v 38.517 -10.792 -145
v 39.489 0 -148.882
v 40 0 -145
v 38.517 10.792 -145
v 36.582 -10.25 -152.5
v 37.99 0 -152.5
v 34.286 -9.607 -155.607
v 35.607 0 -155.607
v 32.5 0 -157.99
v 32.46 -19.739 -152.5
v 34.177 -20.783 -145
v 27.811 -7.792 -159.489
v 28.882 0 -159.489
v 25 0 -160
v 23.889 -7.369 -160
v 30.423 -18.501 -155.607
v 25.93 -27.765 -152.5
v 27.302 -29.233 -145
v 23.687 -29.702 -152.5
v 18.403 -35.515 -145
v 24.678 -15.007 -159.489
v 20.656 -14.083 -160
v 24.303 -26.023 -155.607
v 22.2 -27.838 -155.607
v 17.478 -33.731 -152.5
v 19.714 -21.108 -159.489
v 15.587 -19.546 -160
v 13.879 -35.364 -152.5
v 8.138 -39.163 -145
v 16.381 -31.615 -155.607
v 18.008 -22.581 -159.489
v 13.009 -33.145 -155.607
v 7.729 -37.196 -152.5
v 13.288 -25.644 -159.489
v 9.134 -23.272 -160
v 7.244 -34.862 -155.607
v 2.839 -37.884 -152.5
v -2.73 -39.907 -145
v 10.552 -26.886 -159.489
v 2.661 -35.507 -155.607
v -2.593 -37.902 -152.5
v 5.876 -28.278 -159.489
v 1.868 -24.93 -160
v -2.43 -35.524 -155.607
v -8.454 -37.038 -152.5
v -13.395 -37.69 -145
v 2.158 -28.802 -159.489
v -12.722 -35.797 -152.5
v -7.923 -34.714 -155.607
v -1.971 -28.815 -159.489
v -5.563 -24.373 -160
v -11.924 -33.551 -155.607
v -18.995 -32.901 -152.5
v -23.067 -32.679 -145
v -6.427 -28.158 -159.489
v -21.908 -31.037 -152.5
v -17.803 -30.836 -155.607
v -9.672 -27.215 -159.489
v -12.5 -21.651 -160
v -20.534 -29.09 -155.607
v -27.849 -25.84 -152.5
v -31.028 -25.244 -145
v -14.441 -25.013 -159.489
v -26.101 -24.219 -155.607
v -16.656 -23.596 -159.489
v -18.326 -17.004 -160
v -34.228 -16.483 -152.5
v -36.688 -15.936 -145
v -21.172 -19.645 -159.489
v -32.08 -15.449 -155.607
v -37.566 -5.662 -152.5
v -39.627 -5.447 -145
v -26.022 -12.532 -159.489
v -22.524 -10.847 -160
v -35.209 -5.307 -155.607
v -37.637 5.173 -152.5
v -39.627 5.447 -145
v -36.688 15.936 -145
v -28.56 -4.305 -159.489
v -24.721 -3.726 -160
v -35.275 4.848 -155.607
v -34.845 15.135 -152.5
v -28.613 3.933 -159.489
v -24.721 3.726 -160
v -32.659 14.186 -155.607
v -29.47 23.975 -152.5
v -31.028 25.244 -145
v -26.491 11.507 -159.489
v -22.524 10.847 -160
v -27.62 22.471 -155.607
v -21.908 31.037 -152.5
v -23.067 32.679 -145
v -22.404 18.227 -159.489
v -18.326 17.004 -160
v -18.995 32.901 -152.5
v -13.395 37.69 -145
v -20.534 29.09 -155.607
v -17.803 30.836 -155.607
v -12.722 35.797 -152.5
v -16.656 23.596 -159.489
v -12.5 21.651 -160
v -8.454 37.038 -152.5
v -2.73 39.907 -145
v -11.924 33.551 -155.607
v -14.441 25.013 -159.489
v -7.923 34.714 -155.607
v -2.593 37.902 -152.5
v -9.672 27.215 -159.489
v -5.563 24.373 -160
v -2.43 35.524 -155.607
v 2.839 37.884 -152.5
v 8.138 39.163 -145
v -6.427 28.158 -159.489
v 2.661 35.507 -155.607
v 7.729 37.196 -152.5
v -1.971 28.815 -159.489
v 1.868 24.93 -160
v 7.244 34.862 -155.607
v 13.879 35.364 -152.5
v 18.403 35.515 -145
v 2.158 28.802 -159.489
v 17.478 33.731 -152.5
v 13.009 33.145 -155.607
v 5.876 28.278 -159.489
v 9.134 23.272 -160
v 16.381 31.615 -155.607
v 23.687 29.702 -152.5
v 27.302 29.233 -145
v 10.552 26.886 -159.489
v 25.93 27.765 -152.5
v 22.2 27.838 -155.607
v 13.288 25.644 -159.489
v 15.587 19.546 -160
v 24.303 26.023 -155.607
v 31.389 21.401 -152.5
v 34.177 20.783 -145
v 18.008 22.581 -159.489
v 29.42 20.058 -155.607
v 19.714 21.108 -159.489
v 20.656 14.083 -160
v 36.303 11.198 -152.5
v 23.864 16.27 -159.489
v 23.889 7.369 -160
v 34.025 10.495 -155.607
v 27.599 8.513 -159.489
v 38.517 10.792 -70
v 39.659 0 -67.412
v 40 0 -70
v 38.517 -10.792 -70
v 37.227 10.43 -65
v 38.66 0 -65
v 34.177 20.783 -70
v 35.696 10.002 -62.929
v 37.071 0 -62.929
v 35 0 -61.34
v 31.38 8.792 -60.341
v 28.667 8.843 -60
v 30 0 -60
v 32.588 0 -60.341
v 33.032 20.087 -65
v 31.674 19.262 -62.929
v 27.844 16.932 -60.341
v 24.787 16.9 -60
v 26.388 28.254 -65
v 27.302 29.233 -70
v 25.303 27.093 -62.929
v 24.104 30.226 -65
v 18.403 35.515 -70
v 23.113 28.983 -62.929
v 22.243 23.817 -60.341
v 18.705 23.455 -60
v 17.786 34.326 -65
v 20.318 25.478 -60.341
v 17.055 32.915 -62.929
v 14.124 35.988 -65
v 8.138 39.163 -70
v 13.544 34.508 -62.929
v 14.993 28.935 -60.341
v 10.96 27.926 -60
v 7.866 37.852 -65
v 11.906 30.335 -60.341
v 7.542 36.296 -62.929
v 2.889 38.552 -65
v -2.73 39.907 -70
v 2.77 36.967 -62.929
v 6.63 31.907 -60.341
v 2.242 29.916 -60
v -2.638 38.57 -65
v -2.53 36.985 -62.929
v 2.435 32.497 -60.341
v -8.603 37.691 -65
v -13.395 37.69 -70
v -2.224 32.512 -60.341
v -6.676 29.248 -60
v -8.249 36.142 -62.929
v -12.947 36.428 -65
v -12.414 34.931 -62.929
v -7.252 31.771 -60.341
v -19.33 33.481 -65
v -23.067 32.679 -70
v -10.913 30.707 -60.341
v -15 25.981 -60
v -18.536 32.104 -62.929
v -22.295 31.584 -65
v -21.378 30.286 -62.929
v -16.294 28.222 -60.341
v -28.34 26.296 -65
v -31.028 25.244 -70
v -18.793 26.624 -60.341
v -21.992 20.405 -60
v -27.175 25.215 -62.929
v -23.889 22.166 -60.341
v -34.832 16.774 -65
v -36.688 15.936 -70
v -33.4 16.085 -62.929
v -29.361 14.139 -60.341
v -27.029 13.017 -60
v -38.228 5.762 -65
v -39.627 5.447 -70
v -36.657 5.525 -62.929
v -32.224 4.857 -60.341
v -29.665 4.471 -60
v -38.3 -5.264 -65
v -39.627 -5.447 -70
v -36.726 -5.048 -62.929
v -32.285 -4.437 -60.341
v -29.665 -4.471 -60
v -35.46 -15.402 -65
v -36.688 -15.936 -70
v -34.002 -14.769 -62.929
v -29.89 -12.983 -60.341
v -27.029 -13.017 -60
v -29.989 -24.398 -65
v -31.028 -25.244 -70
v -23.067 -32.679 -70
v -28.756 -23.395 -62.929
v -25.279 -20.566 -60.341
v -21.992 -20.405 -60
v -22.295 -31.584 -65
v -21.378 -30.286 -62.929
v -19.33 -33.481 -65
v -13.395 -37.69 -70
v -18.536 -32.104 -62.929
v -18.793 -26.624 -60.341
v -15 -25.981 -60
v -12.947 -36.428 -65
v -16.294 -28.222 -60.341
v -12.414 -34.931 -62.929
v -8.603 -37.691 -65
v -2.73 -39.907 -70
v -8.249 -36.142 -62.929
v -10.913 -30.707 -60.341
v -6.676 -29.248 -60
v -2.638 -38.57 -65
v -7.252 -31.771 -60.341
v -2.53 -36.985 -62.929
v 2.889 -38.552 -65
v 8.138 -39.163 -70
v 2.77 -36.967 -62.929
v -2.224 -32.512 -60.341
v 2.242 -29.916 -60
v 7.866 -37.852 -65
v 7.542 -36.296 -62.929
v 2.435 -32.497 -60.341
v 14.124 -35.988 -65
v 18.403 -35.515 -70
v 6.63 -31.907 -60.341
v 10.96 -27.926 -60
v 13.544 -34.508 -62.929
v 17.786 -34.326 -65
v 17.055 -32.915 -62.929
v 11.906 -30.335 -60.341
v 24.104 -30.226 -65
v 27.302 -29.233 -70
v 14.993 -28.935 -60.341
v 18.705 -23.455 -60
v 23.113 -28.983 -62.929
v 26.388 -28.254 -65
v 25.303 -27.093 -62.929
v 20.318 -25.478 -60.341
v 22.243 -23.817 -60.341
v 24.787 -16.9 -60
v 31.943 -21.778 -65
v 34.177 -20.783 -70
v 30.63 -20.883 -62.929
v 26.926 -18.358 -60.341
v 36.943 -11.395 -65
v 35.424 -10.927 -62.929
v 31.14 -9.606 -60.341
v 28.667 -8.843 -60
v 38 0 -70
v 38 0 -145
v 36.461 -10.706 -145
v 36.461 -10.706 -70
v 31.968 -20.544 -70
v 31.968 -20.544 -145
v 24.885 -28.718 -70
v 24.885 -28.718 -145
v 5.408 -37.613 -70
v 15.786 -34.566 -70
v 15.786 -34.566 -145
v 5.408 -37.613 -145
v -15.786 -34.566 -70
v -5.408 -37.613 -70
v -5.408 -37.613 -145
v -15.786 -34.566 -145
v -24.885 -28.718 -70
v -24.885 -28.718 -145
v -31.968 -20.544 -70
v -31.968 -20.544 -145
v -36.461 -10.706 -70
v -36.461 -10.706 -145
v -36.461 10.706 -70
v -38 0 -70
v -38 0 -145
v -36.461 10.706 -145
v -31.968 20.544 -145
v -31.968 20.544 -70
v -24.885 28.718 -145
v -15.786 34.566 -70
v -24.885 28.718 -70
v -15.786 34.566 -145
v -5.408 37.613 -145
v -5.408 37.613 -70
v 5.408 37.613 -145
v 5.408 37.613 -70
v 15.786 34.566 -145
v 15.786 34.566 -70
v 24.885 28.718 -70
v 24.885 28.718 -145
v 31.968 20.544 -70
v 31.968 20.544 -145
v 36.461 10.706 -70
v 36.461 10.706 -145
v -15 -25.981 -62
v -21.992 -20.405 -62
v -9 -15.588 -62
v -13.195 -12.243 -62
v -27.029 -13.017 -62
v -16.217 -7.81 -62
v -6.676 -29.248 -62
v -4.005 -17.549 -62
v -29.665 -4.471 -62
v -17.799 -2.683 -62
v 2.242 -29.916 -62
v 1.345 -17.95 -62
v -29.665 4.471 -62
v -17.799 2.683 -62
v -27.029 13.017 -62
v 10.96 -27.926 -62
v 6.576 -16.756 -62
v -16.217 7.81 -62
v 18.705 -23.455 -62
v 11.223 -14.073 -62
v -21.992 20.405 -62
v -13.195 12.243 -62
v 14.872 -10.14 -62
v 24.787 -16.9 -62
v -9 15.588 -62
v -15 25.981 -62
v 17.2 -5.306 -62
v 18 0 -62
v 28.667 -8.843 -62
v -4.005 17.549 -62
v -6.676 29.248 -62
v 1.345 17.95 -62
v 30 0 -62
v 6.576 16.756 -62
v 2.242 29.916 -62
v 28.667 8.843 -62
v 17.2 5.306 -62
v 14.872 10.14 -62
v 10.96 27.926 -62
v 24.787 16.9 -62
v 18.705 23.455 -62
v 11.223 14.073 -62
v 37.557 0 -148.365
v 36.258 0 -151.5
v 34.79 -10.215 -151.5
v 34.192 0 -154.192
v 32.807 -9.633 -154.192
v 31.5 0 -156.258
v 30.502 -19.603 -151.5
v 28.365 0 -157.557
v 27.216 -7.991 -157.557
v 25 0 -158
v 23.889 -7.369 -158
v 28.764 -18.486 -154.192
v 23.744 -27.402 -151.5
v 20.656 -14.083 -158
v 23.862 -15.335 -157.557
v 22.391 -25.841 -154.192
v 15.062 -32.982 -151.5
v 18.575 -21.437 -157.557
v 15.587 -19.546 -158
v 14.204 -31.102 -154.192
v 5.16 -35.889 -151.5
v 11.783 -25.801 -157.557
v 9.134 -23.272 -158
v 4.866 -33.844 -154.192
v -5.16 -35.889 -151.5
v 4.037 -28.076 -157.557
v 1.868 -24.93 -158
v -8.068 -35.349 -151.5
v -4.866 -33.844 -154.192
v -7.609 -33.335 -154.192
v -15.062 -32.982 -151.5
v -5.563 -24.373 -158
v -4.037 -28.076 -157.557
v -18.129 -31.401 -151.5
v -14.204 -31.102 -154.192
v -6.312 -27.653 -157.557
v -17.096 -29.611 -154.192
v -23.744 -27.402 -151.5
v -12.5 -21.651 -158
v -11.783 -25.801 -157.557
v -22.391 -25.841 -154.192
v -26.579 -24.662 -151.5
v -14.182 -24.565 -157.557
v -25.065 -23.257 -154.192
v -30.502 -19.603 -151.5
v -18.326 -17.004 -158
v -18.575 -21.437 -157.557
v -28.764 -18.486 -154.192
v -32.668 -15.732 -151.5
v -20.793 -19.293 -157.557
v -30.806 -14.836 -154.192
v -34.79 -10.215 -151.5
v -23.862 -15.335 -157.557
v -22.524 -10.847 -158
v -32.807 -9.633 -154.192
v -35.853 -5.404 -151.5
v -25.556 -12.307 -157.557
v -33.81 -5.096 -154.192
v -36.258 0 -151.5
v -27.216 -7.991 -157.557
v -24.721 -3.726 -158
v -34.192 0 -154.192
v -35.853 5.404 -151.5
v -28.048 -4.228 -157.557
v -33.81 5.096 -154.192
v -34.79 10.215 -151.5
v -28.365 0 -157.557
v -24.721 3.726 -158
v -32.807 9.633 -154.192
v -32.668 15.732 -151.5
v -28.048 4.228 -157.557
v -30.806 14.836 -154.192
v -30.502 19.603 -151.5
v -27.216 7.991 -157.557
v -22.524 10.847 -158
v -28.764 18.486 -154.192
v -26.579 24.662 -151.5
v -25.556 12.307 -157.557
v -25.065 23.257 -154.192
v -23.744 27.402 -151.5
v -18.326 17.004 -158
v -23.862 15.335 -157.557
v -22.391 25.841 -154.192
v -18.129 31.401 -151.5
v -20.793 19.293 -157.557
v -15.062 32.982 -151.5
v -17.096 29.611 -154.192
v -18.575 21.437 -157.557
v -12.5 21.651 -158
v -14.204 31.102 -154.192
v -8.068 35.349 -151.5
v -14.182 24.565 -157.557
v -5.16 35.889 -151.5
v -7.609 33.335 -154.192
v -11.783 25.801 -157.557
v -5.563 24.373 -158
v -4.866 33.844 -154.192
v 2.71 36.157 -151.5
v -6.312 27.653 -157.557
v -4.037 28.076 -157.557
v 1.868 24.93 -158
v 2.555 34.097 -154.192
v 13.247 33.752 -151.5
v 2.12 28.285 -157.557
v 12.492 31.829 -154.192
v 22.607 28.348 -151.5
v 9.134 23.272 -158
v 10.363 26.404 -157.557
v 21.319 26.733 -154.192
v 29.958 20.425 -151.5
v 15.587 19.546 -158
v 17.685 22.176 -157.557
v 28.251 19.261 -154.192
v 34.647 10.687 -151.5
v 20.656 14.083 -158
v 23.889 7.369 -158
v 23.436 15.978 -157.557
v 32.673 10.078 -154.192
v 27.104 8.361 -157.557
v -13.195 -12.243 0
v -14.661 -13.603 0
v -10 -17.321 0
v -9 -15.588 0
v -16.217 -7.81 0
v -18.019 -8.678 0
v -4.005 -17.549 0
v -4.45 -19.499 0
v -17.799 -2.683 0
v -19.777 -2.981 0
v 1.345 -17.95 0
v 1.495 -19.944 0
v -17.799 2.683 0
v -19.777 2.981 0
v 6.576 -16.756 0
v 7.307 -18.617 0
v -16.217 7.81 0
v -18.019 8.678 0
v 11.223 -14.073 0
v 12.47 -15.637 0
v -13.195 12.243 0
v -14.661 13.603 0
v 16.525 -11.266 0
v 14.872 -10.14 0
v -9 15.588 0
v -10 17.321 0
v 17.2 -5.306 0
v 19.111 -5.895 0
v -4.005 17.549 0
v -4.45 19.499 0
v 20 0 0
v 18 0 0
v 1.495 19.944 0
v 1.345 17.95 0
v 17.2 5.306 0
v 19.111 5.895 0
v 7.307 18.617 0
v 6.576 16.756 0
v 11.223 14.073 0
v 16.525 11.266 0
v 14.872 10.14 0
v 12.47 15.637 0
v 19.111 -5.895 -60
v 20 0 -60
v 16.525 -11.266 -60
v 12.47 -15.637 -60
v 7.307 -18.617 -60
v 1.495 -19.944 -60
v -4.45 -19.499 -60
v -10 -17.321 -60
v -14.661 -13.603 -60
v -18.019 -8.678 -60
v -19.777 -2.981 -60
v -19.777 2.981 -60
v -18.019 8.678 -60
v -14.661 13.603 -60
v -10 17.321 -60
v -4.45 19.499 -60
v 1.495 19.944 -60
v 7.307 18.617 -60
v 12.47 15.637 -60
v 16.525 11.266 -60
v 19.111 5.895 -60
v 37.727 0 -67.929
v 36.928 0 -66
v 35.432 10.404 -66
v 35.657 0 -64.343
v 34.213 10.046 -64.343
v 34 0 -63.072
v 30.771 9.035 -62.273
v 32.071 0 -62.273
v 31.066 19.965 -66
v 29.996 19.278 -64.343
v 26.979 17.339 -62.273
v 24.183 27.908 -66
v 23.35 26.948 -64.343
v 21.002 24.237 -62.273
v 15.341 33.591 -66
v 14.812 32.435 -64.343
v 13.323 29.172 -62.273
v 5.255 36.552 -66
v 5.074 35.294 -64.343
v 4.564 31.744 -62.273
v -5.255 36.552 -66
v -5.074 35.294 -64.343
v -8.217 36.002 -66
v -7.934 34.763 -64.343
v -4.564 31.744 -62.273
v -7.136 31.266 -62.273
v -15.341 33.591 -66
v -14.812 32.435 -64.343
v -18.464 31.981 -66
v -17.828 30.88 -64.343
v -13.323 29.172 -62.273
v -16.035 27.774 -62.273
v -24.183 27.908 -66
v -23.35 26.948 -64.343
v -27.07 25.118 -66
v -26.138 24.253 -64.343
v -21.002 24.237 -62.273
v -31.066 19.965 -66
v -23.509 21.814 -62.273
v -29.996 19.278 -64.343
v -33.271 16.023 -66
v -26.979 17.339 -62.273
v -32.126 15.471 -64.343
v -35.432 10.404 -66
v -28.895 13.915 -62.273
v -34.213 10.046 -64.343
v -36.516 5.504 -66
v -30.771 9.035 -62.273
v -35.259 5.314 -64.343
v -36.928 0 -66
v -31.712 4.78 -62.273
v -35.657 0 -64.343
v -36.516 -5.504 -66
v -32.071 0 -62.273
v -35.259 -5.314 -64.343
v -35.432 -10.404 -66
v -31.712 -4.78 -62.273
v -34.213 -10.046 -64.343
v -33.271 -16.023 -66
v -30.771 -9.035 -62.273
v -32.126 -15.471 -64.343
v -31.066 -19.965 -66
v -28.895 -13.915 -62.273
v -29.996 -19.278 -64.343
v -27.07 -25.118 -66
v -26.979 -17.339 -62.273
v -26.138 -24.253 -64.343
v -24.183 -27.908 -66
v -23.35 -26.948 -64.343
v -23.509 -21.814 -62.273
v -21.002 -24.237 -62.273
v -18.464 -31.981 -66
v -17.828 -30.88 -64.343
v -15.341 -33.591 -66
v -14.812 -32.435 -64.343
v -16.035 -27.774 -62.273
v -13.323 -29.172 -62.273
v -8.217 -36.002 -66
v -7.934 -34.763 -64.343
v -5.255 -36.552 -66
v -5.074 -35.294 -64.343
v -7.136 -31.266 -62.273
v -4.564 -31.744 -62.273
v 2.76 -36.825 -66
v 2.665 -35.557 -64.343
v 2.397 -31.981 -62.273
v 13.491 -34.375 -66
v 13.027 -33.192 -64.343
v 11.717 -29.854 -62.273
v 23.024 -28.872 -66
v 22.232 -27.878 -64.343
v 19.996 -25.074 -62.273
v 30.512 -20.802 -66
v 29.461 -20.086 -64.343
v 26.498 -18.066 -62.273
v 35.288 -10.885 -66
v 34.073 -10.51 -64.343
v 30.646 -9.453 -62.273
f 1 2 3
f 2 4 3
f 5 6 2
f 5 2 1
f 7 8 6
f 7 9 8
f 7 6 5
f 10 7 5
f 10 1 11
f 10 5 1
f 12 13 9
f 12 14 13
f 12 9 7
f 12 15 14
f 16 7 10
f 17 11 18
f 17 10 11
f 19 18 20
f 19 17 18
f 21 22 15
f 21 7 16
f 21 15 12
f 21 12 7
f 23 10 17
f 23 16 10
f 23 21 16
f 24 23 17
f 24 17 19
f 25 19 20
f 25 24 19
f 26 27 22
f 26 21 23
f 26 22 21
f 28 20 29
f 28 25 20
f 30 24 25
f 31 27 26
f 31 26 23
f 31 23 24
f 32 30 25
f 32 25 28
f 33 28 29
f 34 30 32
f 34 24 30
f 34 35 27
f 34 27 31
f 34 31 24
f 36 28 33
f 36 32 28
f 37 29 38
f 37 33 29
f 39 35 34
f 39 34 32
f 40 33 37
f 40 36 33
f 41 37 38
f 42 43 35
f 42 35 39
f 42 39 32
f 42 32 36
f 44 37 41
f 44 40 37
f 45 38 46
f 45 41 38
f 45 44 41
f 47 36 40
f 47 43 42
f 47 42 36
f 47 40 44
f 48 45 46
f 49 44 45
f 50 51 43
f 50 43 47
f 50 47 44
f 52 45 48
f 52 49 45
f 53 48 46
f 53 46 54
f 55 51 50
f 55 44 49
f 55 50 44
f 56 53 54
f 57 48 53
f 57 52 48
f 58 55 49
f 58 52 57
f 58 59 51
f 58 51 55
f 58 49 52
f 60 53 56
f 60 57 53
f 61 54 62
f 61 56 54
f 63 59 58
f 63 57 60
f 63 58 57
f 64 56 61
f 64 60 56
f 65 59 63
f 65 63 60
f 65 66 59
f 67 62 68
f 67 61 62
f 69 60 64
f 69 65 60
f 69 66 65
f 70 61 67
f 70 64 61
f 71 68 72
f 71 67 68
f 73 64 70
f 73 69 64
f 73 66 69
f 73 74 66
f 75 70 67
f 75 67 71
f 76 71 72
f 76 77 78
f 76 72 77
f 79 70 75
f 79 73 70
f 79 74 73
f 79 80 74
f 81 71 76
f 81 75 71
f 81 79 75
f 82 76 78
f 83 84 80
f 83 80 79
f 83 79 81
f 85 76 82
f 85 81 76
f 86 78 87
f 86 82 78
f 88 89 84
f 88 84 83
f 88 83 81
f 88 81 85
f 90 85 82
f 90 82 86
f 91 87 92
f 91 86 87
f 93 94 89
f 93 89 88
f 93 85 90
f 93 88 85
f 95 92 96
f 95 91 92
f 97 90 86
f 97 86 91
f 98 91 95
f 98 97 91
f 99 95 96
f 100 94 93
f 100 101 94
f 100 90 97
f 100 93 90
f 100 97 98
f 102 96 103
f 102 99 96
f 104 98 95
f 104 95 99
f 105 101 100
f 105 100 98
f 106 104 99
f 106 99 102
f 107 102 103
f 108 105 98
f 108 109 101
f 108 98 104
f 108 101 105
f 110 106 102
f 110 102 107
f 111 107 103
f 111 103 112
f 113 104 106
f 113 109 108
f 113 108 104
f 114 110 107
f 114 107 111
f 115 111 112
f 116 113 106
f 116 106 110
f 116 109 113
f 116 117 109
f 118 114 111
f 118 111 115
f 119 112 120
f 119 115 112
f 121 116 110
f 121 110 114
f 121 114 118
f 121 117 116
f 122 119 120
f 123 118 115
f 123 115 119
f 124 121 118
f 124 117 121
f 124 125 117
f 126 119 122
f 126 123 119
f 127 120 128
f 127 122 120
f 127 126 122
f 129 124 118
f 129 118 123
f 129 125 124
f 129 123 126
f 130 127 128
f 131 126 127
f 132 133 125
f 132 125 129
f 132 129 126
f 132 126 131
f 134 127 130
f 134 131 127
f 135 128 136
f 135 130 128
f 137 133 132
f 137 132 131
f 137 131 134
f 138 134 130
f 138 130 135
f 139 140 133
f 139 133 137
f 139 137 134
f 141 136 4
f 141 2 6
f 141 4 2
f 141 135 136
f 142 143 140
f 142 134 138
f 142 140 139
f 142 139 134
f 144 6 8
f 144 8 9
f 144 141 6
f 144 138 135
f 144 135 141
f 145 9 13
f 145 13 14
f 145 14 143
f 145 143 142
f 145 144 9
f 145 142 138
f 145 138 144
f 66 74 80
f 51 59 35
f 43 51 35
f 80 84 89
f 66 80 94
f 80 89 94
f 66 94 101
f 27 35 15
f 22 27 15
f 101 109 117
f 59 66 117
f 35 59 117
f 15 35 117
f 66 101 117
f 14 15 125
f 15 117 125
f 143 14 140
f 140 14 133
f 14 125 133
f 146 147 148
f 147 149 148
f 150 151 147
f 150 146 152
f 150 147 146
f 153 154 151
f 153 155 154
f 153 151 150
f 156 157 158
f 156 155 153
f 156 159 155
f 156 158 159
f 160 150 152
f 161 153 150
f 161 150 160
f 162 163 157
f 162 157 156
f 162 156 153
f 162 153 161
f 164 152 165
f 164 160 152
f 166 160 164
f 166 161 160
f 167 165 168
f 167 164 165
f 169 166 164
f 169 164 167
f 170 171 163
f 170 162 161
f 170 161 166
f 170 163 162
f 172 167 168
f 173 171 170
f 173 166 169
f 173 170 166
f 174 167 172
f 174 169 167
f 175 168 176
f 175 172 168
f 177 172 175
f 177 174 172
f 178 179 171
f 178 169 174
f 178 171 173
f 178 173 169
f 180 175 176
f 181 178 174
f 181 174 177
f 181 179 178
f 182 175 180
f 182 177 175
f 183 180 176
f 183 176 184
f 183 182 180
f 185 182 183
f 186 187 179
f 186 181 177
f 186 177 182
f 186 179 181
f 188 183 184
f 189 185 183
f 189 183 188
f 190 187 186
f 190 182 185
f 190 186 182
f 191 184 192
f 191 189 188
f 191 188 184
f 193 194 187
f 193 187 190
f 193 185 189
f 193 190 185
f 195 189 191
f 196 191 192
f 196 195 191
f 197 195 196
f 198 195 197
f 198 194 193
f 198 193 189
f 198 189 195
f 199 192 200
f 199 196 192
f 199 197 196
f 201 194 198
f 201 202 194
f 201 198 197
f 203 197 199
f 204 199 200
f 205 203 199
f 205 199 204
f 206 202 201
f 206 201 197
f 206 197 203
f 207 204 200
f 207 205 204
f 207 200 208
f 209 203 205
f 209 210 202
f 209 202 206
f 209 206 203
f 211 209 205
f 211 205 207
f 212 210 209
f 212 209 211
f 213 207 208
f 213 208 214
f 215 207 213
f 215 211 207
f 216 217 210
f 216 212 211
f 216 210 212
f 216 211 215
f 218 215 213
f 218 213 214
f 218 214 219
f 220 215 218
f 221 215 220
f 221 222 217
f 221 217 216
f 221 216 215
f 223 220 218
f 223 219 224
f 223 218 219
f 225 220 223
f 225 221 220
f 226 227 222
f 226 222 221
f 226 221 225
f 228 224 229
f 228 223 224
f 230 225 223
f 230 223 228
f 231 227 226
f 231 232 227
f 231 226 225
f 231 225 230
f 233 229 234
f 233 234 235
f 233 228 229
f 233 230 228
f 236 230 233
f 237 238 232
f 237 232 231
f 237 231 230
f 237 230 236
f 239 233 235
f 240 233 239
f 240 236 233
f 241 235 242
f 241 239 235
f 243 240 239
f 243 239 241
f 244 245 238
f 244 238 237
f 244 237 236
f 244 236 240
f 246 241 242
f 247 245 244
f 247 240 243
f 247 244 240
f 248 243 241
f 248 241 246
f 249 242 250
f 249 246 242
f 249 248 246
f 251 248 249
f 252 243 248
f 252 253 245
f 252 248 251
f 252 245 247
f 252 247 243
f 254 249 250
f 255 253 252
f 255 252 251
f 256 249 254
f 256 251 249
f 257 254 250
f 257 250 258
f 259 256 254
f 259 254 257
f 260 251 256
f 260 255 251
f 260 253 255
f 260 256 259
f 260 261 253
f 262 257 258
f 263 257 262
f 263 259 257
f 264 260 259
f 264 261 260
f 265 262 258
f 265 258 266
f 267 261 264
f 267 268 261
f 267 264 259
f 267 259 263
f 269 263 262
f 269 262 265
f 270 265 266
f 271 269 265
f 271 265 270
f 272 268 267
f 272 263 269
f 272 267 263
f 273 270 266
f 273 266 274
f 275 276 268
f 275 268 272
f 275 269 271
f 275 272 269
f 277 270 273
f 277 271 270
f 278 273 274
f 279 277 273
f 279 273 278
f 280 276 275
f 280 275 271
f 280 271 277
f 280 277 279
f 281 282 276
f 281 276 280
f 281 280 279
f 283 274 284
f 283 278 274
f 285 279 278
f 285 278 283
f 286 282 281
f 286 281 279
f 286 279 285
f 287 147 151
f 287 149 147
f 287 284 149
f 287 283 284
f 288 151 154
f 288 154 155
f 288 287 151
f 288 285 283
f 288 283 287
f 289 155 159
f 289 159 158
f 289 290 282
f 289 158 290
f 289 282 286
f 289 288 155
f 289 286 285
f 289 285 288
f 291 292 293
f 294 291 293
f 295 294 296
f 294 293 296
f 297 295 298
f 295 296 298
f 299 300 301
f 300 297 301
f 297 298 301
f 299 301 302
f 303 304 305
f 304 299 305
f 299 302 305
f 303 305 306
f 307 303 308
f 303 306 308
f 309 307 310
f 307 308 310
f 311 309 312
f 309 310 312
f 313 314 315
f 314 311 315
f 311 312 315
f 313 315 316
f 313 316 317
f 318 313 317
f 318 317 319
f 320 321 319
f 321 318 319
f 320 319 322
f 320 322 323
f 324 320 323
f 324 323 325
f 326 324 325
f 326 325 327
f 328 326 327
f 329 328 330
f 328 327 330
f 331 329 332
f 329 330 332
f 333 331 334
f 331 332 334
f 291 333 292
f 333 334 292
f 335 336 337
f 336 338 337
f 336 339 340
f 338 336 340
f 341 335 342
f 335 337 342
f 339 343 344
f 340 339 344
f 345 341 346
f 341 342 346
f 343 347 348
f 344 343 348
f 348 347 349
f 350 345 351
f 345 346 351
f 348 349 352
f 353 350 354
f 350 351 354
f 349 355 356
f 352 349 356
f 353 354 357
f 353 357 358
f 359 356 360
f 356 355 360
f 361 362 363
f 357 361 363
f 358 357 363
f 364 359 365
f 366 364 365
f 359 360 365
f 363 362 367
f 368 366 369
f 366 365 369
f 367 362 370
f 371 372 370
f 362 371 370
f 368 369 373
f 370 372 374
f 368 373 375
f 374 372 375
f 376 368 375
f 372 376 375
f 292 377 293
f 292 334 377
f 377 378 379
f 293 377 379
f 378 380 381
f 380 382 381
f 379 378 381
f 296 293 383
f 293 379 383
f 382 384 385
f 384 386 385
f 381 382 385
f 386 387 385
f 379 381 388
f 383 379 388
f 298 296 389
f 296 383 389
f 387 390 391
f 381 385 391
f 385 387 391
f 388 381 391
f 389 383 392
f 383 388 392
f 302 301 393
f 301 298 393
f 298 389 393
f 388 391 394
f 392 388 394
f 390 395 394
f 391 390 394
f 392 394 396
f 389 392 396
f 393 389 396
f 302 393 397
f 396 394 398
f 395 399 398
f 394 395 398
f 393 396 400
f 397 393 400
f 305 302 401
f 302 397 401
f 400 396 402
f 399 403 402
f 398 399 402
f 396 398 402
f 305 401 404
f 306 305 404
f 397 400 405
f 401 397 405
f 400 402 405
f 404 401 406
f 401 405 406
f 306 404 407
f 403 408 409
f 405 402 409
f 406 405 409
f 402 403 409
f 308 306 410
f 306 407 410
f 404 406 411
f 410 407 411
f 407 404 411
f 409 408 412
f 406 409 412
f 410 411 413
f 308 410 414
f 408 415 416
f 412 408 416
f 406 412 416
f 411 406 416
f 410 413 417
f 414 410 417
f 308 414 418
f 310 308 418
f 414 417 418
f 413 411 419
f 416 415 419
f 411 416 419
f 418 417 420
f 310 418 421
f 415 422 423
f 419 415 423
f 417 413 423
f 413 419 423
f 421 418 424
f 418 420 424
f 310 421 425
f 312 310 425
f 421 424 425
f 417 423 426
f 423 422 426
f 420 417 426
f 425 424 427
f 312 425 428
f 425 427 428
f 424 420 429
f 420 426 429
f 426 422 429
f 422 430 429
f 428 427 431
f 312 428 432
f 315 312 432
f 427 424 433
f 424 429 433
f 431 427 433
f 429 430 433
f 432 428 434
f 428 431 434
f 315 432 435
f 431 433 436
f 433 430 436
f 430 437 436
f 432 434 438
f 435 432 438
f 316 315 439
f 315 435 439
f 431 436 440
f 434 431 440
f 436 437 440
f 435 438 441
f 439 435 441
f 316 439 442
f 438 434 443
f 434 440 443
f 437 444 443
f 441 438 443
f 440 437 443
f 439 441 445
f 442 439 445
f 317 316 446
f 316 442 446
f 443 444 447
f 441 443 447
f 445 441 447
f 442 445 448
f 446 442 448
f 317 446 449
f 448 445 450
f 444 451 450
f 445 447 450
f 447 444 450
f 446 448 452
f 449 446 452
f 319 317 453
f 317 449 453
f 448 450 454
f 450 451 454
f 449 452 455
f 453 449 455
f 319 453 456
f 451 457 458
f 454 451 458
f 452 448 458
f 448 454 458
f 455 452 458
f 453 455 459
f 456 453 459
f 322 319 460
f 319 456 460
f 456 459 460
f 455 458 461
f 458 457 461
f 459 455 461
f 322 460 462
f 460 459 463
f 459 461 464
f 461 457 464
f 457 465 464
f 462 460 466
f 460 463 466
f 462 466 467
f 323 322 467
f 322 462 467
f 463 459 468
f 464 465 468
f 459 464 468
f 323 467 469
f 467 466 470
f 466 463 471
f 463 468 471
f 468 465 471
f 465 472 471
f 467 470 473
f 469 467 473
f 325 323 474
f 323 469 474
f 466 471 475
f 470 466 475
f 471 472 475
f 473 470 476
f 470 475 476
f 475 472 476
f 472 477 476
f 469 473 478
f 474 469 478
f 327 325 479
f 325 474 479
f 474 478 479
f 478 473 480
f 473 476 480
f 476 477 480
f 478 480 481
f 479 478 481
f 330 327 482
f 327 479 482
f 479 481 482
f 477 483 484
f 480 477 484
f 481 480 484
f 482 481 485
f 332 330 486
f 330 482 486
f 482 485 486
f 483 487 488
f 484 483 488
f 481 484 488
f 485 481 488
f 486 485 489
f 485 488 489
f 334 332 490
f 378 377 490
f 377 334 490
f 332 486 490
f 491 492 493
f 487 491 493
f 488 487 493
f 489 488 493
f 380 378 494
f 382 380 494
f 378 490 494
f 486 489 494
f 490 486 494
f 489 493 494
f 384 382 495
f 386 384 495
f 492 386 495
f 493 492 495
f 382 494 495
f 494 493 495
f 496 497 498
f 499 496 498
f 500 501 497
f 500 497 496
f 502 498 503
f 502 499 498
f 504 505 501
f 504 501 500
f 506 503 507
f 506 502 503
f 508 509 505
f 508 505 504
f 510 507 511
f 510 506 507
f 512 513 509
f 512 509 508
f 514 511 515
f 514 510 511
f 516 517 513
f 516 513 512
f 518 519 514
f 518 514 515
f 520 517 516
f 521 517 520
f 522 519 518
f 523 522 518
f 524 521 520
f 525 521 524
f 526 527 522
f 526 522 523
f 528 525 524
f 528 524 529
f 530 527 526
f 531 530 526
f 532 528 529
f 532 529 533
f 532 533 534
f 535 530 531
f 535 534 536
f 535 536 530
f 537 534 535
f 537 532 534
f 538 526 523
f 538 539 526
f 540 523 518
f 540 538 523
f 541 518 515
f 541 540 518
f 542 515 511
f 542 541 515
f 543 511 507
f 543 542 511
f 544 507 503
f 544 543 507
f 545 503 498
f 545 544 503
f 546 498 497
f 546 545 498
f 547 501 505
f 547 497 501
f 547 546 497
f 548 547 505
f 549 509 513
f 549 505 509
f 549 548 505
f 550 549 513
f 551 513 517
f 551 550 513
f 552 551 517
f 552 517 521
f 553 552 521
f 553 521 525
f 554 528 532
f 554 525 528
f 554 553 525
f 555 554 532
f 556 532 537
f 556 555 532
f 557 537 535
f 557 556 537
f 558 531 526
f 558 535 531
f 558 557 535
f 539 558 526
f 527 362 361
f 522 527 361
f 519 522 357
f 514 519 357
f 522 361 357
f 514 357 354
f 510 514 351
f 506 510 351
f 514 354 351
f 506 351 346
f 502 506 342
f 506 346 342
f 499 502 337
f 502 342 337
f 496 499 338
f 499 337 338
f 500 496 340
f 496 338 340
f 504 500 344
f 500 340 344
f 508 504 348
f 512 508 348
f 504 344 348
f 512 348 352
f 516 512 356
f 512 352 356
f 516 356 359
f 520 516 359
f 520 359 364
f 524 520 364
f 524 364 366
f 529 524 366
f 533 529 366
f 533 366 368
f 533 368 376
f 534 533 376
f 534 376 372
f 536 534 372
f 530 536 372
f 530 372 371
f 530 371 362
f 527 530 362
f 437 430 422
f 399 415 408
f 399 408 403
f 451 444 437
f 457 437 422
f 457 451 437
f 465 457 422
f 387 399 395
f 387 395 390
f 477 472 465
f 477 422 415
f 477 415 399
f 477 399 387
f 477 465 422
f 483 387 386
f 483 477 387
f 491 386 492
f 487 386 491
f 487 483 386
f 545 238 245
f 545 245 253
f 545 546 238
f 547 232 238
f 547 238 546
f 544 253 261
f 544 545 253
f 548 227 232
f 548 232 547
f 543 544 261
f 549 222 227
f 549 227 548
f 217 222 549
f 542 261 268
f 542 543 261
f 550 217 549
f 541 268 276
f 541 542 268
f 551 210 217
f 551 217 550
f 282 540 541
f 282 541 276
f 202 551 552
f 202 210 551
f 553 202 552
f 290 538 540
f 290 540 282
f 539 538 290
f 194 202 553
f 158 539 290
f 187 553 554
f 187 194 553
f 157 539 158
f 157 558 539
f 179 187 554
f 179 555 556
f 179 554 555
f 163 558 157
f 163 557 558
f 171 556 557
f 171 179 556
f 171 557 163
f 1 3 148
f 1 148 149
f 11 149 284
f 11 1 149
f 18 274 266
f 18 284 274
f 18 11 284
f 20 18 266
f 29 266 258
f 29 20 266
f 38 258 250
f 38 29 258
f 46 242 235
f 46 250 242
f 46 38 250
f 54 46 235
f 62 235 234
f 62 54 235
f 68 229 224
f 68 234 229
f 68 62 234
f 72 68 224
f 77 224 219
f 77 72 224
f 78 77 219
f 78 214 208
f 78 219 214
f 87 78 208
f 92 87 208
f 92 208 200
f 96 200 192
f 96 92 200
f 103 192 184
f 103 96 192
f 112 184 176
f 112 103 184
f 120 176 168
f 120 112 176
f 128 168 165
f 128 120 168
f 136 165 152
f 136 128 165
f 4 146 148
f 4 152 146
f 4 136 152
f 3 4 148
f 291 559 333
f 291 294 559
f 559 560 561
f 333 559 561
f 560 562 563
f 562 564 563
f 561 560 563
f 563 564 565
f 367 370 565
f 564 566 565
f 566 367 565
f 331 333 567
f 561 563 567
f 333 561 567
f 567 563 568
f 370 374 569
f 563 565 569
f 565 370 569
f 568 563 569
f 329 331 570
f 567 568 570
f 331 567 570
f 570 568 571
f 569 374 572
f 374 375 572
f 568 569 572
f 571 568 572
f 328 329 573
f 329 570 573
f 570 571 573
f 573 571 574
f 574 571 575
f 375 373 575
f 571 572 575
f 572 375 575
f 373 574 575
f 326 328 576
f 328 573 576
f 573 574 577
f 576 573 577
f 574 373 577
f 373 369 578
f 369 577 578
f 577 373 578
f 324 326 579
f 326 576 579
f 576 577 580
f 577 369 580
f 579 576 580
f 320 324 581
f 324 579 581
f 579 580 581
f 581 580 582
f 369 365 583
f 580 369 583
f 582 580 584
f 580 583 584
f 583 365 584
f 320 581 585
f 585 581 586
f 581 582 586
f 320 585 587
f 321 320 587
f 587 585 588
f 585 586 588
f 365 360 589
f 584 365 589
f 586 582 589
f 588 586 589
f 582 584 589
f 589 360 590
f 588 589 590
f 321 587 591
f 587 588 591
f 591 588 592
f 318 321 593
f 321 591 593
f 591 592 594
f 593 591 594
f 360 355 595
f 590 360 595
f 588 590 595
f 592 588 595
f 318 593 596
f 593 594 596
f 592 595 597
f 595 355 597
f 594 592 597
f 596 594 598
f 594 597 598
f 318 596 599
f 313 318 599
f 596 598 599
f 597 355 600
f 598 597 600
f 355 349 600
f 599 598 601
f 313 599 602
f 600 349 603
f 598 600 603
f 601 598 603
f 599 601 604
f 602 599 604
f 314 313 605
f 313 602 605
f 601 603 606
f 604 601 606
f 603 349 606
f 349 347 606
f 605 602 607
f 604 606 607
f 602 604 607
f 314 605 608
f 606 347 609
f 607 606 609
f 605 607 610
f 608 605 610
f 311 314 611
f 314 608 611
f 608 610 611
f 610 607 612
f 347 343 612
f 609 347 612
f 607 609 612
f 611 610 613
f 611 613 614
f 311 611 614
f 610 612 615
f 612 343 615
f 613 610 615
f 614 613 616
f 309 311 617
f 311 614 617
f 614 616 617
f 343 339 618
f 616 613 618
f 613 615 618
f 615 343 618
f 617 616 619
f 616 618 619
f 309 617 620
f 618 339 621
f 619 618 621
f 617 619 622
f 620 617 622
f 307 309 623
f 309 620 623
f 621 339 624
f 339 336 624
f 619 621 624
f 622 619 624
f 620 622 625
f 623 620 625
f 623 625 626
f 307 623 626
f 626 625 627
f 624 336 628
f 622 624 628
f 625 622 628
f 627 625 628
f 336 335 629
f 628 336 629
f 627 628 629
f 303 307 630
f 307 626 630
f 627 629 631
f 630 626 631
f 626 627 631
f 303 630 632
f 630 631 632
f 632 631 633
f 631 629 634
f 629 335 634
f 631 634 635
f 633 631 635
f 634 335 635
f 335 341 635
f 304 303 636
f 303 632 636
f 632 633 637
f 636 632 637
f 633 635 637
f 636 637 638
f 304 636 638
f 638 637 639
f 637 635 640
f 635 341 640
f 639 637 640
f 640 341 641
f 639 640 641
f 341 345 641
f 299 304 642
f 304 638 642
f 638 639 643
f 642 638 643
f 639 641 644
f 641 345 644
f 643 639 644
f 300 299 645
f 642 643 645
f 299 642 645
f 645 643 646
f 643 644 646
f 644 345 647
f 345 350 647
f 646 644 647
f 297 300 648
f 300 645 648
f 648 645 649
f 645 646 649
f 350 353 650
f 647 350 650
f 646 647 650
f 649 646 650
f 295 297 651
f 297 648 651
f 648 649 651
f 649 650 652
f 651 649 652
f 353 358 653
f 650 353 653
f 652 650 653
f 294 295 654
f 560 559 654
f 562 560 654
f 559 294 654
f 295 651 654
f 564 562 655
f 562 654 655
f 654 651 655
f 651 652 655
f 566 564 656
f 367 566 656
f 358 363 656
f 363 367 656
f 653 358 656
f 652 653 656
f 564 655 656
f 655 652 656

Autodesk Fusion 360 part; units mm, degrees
sketch "Sketch1" plane through (0, 0, 0) normal (0, 1, 0) x (1, 0, 0)
  line L0 (0, 0) -> (20, 0)
  line L1 (20, 0) -> (20, 60)
  line L2 (20, 60) -> (40, 60)
  line L3 (40, 60) -> (40, 160)
  line L4 (40, 160) -> (0, 160)
  line L5 (0, 160) -> (0, 0)
  dimension "d8" = 100
  dimension "d9" = 160
  dimension "d10" = 20
revolve "Revolve1" add sketch "Sketch1" angle 360 about axis through (0, 0, -160) along (0, 0, 1)
fillet "Fillet1" radius 10 1 edges at (-37.2931, -14.4646, -60)
fillet "Fillet2" radius 15 1 edges at (-37.2931, -14.4646, -160)
shell "Shell1" thickness 2 removed faces 1 at (3.8604, -3.2472, 0)
equation "overalheight = 160 mm"
equation "neckheight = 100 mm"
equation "fillet1 = 15 mm"
equation "fillet2 = 10 mm"
equation "fillet3 = 5 mm"
equation "diameter = 20 mm"
equation "wallthickness = 2 mm"
equation "d8 = neckheight"
equation "d9 = overalheight"
equation "d10 = diameter"
equation "d12 = fillet2"
equation "d13 = fillet1"
equation "d14 = wallthickness"
